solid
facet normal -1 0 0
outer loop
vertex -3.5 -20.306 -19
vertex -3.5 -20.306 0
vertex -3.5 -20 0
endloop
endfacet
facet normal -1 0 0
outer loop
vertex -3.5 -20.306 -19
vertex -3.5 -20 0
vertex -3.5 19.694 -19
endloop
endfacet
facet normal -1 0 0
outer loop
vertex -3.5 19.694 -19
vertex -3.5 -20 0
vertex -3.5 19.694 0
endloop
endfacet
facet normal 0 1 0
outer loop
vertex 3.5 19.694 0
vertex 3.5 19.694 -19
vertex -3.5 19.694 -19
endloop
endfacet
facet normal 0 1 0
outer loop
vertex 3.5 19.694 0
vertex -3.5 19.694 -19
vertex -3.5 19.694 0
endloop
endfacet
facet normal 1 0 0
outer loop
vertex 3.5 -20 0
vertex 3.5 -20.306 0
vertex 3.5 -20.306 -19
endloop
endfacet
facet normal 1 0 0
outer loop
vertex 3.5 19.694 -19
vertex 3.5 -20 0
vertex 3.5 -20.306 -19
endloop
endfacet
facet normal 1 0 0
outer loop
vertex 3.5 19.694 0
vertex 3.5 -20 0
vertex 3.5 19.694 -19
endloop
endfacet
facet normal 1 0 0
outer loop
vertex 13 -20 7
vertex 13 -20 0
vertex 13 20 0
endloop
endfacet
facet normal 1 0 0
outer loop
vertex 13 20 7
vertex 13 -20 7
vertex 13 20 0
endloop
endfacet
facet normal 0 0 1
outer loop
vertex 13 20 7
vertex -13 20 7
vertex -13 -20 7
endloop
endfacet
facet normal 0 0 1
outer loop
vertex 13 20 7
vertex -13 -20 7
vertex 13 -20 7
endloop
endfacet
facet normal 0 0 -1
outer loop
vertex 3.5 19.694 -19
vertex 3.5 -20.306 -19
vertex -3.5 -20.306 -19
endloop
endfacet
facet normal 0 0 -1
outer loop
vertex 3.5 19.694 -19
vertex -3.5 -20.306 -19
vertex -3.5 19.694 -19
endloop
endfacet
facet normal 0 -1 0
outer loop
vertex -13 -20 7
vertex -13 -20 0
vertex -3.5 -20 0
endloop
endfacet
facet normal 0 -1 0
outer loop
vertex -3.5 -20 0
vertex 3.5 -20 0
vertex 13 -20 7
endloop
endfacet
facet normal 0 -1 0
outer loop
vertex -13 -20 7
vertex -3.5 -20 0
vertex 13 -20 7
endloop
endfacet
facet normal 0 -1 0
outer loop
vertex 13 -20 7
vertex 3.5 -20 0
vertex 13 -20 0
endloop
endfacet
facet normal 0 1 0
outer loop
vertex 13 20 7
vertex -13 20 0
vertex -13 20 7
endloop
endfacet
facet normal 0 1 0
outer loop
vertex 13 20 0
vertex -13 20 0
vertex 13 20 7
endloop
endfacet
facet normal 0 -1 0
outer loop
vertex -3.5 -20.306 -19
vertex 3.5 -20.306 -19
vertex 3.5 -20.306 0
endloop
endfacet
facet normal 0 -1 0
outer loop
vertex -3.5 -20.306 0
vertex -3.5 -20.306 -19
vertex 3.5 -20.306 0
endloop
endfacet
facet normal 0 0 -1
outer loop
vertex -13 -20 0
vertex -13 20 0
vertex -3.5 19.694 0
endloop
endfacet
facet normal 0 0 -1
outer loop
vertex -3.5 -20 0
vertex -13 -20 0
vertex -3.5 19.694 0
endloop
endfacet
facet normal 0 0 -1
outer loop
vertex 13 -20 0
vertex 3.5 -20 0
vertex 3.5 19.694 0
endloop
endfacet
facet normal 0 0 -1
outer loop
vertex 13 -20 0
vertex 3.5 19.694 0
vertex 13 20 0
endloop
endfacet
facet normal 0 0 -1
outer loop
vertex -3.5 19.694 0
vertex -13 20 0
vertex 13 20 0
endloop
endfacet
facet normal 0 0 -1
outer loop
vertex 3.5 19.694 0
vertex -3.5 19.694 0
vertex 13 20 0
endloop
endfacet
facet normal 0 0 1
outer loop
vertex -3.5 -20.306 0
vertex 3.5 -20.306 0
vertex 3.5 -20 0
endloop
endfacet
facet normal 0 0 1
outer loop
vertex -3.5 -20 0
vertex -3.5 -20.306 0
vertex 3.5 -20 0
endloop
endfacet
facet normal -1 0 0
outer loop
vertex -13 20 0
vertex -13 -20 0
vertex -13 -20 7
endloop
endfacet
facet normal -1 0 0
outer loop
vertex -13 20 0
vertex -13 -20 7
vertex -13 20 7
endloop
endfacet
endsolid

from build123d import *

# Parameters (mm, degrees)
F1_W     = 26
F1_H     = 40
F2_DEPTH = 7
F0_W     = 40
F0_H     = 19
F3_DEPTH = 3.5


with BuildPart() as f2:
    # F1 (on Top) → F2 (new body)
    with BuildSketch(Plane.XY):
        Rectangle(F1_W, F1_H)
    extrude(amount=F2_DEPTH)

    # F0 (on Right) → F3 (join, symmetric)
    with BuildSketch(Plane.YZ):
        with Locations((-0.3058470263, -9.5)):
            Rectangle(F0_W, F0_H)
    extrude(amount=F3_DEPTH, both=True)


solid = f2.part
